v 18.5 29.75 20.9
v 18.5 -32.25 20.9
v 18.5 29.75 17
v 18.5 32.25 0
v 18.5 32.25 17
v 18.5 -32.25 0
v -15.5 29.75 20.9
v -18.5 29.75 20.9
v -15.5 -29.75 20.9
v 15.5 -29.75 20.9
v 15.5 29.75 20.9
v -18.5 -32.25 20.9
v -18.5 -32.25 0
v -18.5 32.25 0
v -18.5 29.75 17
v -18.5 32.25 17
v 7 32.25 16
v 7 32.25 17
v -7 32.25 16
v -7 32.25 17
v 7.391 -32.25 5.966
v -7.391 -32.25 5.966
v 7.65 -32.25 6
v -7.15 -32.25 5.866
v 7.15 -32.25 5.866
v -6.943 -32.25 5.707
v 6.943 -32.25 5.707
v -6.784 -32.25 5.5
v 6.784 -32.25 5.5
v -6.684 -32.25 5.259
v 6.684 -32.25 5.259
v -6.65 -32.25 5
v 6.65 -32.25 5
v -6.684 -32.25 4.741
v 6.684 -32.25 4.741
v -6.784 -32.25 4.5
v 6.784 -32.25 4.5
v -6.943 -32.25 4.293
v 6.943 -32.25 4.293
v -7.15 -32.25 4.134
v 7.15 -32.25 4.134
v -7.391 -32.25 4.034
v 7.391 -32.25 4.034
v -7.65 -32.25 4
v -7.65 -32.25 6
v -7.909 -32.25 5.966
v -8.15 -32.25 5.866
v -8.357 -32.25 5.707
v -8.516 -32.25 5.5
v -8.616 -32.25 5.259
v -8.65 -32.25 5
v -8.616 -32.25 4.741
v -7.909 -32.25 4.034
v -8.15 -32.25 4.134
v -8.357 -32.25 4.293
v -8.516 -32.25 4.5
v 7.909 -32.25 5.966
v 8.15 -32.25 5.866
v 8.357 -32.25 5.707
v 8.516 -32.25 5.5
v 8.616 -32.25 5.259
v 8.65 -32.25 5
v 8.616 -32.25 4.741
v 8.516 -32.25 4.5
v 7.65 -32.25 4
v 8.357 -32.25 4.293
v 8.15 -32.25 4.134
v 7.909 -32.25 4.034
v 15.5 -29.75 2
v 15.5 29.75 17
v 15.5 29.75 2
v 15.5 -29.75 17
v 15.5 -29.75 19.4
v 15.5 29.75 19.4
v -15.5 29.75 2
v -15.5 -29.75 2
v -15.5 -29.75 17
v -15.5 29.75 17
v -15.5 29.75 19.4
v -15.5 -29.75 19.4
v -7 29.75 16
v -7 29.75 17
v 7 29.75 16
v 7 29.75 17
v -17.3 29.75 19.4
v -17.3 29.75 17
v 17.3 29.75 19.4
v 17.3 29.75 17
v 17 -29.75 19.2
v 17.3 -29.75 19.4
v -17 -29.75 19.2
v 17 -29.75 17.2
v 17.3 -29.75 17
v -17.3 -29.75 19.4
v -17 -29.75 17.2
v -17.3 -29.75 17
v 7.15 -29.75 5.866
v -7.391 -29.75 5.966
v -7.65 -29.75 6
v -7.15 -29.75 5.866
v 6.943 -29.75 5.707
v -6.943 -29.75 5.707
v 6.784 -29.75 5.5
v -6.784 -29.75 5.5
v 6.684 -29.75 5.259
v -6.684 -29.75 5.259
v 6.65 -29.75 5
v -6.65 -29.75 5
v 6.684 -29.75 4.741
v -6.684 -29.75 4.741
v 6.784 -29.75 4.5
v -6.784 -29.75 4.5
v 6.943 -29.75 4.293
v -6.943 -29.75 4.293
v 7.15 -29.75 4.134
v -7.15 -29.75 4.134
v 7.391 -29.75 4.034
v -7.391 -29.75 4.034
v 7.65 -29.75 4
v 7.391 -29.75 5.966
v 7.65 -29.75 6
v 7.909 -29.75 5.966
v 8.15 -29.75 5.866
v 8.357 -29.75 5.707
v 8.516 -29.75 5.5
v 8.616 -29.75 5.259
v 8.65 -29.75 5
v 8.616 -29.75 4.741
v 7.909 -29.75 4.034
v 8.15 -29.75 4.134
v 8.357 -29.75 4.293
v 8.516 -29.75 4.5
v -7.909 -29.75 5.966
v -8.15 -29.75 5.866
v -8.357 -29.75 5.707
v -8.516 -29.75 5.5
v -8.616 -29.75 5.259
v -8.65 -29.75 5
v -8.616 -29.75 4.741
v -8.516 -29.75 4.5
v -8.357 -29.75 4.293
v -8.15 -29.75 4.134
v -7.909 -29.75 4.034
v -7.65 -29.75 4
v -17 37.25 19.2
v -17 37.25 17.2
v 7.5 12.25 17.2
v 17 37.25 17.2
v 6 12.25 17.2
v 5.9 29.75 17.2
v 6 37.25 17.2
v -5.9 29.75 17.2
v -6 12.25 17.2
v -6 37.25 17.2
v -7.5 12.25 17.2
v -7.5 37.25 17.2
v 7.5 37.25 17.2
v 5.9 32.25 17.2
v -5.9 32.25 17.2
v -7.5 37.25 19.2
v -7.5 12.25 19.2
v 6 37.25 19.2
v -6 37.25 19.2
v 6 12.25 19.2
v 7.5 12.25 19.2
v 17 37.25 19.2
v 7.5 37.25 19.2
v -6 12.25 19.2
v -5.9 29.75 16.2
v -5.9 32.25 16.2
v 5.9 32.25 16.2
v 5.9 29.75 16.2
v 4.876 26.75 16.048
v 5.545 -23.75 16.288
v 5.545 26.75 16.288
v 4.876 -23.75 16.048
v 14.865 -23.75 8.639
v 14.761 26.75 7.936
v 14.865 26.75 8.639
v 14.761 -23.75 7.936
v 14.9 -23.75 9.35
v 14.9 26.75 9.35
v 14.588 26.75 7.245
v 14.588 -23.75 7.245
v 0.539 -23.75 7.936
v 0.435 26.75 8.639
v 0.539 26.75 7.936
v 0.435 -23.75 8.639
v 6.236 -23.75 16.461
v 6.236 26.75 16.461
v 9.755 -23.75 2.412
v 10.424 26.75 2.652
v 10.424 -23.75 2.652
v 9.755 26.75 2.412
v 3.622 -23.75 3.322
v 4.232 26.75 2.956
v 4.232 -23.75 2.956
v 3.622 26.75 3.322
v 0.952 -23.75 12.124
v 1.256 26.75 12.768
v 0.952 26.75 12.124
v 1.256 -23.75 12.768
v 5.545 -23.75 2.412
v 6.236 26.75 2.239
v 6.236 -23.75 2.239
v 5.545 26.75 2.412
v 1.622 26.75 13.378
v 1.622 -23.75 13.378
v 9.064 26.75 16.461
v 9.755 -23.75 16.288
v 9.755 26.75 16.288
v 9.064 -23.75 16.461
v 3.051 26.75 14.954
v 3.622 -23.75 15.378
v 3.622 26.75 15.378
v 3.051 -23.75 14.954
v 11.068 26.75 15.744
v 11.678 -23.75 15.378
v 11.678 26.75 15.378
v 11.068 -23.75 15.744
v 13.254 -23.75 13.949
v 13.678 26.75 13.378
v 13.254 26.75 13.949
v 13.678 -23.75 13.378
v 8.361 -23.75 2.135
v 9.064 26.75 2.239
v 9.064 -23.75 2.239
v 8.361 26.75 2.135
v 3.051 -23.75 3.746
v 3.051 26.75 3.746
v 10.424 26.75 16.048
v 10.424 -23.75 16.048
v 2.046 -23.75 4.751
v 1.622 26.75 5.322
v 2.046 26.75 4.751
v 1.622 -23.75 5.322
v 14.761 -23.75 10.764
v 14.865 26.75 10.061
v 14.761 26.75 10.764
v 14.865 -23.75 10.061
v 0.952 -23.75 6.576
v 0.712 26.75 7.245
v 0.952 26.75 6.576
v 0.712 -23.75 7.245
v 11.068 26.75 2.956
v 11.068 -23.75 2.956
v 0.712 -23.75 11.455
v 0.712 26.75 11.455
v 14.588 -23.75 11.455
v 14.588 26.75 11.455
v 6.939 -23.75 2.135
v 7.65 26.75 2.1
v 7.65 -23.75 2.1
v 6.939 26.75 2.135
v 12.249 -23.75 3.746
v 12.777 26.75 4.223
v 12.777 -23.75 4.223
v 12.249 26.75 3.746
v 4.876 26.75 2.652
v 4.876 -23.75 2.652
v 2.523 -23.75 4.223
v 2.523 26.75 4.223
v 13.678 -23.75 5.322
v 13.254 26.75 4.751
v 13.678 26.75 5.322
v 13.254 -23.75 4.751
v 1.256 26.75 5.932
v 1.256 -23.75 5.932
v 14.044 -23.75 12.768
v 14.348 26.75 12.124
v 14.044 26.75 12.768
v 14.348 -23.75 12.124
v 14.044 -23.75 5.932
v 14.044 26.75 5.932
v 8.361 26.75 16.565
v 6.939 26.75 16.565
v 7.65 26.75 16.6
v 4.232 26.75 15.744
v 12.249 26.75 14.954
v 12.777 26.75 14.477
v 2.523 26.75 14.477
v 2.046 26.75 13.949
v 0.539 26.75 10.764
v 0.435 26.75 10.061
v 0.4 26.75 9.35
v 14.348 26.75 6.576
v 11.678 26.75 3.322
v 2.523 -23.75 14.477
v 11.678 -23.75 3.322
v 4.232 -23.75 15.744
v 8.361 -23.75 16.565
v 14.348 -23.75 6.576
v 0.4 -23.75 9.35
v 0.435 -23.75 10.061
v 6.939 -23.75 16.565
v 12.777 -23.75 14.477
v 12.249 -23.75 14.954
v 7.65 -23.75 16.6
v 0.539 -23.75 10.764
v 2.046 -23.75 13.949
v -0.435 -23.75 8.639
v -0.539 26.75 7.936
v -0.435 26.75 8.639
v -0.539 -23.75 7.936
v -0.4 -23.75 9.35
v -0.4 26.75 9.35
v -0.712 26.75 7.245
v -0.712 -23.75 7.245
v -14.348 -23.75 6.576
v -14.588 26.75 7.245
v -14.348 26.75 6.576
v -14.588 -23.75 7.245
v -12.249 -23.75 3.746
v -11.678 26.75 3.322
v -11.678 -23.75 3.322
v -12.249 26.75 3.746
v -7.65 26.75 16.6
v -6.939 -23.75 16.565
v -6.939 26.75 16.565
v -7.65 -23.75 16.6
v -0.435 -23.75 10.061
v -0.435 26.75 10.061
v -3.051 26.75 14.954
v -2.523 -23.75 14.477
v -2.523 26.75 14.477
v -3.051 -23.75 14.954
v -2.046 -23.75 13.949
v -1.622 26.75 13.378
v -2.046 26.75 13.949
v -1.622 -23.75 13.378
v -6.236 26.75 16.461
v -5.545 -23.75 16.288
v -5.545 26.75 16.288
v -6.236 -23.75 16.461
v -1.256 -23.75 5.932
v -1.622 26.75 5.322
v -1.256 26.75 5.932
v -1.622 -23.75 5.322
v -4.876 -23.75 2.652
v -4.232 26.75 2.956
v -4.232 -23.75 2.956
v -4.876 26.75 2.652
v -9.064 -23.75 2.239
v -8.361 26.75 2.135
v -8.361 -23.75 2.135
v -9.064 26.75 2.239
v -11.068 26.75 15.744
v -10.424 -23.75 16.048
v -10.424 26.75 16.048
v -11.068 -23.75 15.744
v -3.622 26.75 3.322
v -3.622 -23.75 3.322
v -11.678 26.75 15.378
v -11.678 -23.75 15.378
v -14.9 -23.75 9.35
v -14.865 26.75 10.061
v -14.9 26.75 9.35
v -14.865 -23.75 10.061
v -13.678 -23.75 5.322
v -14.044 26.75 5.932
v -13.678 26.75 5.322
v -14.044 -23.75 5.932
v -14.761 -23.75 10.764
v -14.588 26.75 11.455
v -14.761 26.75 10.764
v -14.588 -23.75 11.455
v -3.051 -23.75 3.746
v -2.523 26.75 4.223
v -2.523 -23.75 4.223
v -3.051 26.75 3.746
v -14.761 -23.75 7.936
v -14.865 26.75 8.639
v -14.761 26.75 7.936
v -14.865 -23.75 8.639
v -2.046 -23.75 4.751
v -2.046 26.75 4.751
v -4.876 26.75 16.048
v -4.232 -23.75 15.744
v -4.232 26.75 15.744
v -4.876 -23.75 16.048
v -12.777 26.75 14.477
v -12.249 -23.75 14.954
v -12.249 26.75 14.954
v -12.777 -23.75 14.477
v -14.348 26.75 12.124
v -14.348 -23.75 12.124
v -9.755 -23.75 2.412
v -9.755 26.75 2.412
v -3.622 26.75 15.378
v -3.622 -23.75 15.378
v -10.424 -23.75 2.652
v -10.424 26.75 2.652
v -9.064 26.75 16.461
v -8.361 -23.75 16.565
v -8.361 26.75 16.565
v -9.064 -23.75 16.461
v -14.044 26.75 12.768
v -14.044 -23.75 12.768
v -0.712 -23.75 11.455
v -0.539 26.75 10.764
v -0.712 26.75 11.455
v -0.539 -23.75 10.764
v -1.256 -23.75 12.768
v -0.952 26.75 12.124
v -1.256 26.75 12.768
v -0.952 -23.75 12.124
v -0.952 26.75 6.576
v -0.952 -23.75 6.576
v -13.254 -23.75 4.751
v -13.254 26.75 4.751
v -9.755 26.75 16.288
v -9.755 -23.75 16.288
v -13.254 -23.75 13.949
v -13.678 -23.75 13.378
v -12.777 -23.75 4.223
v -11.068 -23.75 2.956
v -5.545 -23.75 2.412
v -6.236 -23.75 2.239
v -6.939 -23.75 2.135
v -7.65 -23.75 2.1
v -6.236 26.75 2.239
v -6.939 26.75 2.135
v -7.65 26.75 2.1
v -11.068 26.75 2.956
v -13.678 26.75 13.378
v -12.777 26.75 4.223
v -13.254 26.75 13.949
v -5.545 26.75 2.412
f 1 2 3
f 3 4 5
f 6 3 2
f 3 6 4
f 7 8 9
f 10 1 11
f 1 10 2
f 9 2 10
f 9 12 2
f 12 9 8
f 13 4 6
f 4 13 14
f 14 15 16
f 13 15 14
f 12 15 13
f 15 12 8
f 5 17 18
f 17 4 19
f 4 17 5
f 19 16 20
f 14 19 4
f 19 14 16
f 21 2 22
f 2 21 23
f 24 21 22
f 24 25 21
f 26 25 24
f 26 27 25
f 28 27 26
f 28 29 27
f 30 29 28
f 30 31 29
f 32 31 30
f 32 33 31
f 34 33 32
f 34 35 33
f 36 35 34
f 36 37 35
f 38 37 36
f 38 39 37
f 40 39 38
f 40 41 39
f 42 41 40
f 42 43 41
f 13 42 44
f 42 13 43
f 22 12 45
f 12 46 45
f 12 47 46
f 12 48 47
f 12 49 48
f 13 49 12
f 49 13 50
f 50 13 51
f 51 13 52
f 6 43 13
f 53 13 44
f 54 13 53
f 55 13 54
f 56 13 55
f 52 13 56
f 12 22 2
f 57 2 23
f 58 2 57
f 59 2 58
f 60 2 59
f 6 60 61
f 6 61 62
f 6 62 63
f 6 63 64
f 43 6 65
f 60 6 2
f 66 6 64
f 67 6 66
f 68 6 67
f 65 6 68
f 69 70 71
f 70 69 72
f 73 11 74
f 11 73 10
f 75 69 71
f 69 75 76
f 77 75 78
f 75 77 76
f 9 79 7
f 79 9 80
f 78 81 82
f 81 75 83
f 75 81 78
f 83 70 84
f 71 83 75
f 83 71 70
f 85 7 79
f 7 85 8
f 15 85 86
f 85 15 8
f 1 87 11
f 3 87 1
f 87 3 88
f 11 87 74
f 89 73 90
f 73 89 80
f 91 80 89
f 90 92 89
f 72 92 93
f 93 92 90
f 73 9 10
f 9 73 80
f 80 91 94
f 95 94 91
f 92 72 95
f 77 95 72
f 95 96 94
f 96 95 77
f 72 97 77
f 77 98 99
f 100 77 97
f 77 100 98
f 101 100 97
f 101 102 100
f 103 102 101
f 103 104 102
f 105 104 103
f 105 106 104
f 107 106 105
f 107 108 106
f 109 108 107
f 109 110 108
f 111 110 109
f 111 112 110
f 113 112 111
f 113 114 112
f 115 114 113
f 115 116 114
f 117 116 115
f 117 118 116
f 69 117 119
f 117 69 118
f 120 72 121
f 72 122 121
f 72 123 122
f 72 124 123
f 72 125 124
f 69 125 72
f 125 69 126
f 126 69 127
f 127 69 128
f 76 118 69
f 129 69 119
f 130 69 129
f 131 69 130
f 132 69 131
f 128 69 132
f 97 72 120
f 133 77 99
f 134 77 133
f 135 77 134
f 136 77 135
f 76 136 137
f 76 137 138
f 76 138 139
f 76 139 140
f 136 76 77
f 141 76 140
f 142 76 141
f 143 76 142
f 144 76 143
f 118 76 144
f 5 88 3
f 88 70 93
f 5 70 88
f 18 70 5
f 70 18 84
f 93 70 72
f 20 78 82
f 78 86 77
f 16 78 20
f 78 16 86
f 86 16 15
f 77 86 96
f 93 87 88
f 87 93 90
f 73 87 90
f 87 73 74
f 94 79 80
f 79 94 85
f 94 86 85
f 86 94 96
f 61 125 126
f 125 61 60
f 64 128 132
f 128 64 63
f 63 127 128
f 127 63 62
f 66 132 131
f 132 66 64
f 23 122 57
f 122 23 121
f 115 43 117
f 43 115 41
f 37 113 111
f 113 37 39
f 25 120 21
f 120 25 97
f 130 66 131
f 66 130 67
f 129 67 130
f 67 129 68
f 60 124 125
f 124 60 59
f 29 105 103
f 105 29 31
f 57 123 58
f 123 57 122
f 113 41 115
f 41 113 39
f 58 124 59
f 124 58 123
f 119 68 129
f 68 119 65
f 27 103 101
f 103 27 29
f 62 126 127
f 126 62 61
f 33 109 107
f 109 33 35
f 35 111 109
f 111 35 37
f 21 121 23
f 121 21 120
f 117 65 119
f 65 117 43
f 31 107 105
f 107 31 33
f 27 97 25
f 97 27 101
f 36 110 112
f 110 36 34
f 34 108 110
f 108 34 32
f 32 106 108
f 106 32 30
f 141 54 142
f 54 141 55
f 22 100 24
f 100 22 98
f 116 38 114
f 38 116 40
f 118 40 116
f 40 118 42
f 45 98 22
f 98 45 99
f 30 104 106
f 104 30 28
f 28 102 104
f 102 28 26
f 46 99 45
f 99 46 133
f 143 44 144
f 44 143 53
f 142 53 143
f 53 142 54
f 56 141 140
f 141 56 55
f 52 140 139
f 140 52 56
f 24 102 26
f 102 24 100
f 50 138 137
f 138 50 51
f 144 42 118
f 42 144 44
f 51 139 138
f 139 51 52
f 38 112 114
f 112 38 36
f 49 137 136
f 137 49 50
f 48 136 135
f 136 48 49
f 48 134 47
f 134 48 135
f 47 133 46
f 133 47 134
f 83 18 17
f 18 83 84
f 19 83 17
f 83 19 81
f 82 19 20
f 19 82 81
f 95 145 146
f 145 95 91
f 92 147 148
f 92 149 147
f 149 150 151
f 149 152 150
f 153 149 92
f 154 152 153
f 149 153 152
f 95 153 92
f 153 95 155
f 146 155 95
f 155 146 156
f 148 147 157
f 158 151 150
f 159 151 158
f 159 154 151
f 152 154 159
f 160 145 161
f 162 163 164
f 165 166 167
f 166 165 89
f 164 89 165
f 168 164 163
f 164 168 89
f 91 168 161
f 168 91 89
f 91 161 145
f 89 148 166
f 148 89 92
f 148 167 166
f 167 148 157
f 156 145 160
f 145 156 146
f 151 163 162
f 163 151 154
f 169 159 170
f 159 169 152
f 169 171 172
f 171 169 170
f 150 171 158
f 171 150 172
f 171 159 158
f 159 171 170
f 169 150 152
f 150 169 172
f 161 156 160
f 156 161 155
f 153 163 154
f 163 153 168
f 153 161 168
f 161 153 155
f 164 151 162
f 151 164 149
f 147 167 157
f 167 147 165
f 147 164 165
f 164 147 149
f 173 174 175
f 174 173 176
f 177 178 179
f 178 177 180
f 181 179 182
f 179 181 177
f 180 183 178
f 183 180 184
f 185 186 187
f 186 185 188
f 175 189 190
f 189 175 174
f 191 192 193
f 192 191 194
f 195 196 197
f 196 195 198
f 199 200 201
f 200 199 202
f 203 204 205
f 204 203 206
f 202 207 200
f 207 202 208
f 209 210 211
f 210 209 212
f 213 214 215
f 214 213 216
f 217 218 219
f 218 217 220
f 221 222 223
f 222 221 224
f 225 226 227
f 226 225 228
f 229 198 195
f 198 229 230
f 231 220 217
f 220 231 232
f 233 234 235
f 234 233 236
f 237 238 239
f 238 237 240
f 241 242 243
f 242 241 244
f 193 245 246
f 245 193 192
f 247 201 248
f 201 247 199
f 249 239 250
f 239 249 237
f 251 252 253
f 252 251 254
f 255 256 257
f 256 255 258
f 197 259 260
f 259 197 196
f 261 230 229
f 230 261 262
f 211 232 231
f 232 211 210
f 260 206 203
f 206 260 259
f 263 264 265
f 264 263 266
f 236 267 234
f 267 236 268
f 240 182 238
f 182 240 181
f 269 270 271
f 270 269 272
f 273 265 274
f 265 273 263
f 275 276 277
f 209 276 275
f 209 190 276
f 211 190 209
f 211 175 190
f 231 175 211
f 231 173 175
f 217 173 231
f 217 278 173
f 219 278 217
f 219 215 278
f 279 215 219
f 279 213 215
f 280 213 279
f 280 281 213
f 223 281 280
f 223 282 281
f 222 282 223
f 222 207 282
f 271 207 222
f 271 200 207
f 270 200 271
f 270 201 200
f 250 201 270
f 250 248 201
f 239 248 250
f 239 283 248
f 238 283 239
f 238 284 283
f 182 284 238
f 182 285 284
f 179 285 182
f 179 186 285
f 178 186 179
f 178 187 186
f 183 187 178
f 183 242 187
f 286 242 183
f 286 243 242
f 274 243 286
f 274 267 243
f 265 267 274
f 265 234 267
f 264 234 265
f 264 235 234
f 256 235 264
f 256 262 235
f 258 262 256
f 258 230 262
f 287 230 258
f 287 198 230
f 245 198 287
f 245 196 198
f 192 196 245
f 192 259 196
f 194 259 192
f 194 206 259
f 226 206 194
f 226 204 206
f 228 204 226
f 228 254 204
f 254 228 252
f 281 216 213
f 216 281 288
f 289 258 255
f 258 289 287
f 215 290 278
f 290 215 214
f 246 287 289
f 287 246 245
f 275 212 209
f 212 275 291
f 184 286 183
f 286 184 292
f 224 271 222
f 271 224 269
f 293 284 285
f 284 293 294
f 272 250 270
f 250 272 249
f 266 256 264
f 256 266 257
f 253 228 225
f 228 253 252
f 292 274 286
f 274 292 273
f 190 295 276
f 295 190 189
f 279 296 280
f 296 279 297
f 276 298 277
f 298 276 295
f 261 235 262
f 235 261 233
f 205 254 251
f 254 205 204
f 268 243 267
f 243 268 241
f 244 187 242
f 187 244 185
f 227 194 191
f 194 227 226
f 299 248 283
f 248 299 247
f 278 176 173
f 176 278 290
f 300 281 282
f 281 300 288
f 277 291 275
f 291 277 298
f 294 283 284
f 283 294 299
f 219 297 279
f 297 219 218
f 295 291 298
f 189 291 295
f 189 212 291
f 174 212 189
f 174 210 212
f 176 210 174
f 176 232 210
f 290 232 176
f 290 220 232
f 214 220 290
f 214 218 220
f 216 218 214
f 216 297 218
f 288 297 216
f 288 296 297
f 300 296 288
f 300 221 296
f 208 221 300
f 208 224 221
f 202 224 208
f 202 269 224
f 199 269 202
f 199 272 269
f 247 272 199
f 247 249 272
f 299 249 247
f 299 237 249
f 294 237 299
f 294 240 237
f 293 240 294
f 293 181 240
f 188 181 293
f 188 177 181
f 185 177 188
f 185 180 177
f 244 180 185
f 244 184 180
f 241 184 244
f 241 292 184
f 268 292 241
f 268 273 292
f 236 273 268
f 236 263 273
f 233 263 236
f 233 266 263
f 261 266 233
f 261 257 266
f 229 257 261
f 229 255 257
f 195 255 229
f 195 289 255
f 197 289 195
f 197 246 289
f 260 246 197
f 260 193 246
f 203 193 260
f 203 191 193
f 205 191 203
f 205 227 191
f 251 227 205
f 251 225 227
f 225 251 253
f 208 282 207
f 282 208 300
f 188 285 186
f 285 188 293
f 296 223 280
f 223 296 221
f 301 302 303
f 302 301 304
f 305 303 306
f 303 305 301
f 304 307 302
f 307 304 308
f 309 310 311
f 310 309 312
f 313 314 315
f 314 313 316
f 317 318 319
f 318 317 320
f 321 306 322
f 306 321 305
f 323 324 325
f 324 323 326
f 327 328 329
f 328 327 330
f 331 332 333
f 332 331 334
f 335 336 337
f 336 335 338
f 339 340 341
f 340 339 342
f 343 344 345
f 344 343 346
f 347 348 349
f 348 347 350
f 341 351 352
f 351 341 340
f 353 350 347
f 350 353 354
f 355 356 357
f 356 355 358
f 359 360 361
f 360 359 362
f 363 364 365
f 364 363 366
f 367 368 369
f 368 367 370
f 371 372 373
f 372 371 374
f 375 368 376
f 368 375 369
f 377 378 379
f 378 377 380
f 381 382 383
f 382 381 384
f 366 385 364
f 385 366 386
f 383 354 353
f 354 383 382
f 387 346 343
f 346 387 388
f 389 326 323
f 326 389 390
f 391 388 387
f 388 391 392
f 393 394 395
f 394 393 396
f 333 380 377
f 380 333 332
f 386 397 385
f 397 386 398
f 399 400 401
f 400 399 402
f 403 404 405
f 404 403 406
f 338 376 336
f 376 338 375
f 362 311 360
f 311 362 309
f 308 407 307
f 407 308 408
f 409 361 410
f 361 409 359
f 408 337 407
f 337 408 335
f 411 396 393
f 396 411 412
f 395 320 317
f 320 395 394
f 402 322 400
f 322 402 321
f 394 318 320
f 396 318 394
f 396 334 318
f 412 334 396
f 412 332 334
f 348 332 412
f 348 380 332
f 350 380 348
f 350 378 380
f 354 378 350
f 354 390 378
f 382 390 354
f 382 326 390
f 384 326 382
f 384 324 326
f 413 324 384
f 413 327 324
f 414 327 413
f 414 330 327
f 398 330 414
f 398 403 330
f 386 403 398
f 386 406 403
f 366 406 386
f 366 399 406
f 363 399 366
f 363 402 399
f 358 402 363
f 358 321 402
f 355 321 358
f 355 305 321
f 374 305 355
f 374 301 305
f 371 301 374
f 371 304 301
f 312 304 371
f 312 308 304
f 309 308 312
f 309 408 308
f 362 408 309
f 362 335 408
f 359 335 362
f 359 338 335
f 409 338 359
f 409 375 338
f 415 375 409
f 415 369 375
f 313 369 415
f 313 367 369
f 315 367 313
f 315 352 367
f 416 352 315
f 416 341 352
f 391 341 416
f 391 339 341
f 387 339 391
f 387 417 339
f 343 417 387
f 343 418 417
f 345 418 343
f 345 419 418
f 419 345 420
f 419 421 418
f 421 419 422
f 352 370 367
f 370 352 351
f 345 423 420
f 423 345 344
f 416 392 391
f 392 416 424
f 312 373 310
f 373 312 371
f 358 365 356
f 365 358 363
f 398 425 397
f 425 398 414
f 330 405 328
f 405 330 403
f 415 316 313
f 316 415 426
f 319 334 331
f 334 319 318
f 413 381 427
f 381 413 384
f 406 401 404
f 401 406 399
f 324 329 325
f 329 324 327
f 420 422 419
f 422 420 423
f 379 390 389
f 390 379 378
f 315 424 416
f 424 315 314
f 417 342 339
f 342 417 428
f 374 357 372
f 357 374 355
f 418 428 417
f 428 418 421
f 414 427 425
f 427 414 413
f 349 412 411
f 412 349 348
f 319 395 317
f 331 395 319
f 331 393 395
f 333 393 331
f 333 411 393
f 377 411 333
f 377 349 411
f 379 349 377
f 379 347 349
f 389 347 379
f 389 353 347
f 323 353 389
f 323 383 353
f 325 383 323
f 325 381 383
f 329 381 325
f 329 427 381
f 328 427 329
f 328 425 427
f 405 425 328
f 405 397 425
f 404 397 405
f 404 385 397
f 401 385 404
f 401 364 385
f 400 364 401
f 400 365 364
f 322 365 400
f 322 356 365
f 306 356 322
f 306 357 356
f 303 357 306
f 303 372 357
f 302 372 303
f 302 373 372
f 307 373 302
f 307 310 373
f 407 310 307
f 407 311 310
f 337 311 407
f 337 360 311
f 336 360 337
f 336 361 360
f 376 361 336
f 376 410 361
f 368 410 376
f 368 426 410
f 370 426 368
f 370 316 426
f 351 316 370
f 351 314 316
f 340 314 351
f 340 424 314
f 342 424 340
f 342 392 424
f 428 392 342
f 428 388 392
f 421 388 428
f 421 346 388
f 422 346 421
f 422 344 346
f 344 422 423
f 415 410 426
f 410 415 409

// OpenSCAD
/* Holder for two AA batteries with sliding cover.
   PLA, 0.4mm nozzle, no supports. Units mm.
   Print orientation: +Z up, parts rest on min z.
*/

// ---------- parameters ----------
battery_d = 14.5;
battery_l = 50.5;
side_gap = 0.6;      // battery side to wall
mid_gap = 0.8;       // between batteries
Wi = 2*battery_d + mid_gap + 2*side_gap; // 31.0 interior width
Li = battery_l + 3 + 6;                  // 59.5 interior length
floor_t = 2.0;
side_t = 3.0;
end_t = 2.5;
Wext = Wi + 2*side_t;   // 37
Lext = Li + 2*end_t;    // 64.5
wall_top = 20.9;
low_top = 17.0;
groove_bottom = 17.0;
groove_h = 2.4;
groove_top = groove_bottom + groove_h; // 19.4
groove_depth = 1.8;
engage = 1.5;
Wc = Wi + 2*engage;     // 34 cover width
Lc0 = Lext/2 + Li/2;      // 62 main length (leading edge butts on spring wall)
lip_len = 5.0;
Lc = Lc0 + lip_len;     // 67 total cover length
y0b = -Lext/2;          // -32.25 base min y
y1b = Lext/2;           // 32.25 base max y
y0c = -Li/2;            // -29.75 cover min y (stops at spring wall inner face)
y1c = Lext/2 + lip_len; // 37.25 cover max y
tc = 2.0;
finger_w = 12;
slot_w = 1.5;
finger_y0 = 12.25;
tooth_w = 11.8;
tooth_yl = 2.5;
tooth_y0 = 29.75;
tooth_y1 = tooth_y0 + tooth_yl; // 32.25
tooth_h = 1.0;
notch_hw = 7;
notch_y0 = 29.65;
notch_y1 = 32.35;
notch_bot = 16.0;
bx = battery_d/2 + mid_gap/2; // 7.65 battery center x
battery_y0 = -Li/2 + 6;       // -23.75 spring side
battery_y1 = battery_y0 + battery_l; // 26.75
battery_yc = (battery_y0 + battery_y1)/2; // 1.5
battery_zc = floor_t + battery_d/2 + 0.1; // 9.35 slight lift
wire_z = 5;
wire_r = 1.0;

part = "assembly"; // [base, cover, assembly]
cadverify_only = "";
module instance(name, part, unit = 1) {
    echo(cadverify_instance = [name, part, unit]);
    if (cadverify_only == "" || cadverify_only == name) children();
}

module battery() {
    rotate([-90,0,0])
        cylinder(d=battery_d, h=battery_l, center=true, $fn=64);
}

module base() {
    difference() {
        // outer solid
        translate([-Wext/2, y0b, 0])
            cube([Wext, Lext, wall_top]);
        // interior cavity open at top
        translate([-Wi/2, -Li/2, floor_t])
            cube([Wi, Li, wall_top - floor_t + 1]);
        // low end wall cut (+Y end)
        translate([-Wext/2, Li/2, low_top])
            cube([Wext, Lext/2 - Li/2 + 0.5, wall_top - low_top + 1]);
        // left groove
        translate([Wi/2, -Li/2, groove_bottom])
            cube([groove_depth, Li/2 + Lext/2 + 0.5, groove_h]);
        // right groove
        translate([-Wi/2 - groove_depth, -Li/2, groove_bottom])
            cube([groove_depth, Li/2 + Lext/2 + 0.5, groove_h]);
        // wire holes through spring (-Y) wall
        translate([bx, y0b - 1, wire_z])
            rotate([-90,0,0])
                cylinder(r=wire_r, h=end_t + 2, $fn=24);
        translate([-bx, y0b - 1, wire_z])
            rotate([-90,0,0])
                cylinder(r=wire_r, h=end_t + 2, $fn=24);
        // latch notch in low wall top
        translate([-notch_hw, notch_y0, notch_bot])
            cube([2*notch_hw, notch_y1 - notch_y0, low_top - notch_bot + 0.02]);
    }
}

module cover() {
    // print orientation: plate 0..tc, tooth on top tc..tc+tooth_h
    difference() {
        union() {
            translate([-Wc/2, y0c, 0])
                cube([Wc, Lc, tc]);
            // latch tooth on top (becomes bottom after flip)
            translate([-tooth_w/2, tooth_y0, tc])
                cube([tooth_w, tooth_yl, tooth_h]);
        }
        // finger slots, open at +Y lip end
        translate([finger_w/2, finger_y0, -0.5])
            cube([slot_w, y1c - finger_y0 + 0.5, tc + 1.5]);
        translate([-finger_w/2 - slot_w, finger_y0, -0.5])
            cube([slot_w, y1c - finger_y0 + 0.5, tc + 1.5]);
    }
}

module assembly() {
    instance("base", "base", 1) base();
    instance("battery_left", "external", 1)
        translate([bx, battery_yc, battery_zc]) battery();
    instance("battery_right", "external", 1)
        translate([-bx, battery_yc, battery_zc]) battery();
    // cover printed upside-down: rotate 180 about Y then lift
    instance("cover", "cover", 1)
        translate([0, 0, 19.2]) rotate([0,180,0]) cover();
}

// ---------- specs ----------
if (part == "base") {
    echo(cadverify_spec = [
        ["bounds", [[-Wext/2, y0b, 0], [Wext/2, y1b, wall_top]]],
        ["bodies", 1],
        ["through_holes", 2],
        ["support_faces", [["bottom", "-z", 2000]]],
        ["overhangs_allowed", [
            ["groove ceilings bridge 3.6mm", [[Wi/2 - 0.6, -Li/2 - 0.5, groove_bottom - 0.5], [Wi/2 + groove_depth + 0.5, y1b + 0.2, groove_top + 0.6]]],
            ["groove ceilings bridge 3.6mm", [[-Wi/2 - groove_depth - 0.5, -Li/2 - 0.5, groove_bottom - 0.5], [-Wi/2 + 0.6, y1b + 0.2, groove_top + 0.6]]],
            ["wire holes 2mm dia bridges", [[-10, y0b - 0.5, wire_z - 1.5], [10, -Li/2 + 0.5, wire_z + 1.5]]]
        ]],
        ["copies", 1],
        ["details", [
            ["cavity", "void", [[-Wi/2, -Li/2, floor_t], [Wi/2, Li/2, 17]], 0.9],
            ["spring_room", "void", [[-Wi/2, -Li/2, floor_t], [Wi/2, -Li/2 + 6, 16.6]], 0.9],
            ["pos_room", "void", [[-Wi/2, Li/2 - 3, floor_t], [Wi/2, Li/2, 16.6]], 0.9],
            ["groove_left", "void", [[Wi/2, -Li/2, groove_bottom], [Wi/2 + groove_depth, y1b, groove_top]], 0.85],
            ["groove_right", "void", [[-Wi/2 - groove_depth, -Li/2, groove_bottom], [-Wi/2, y1b, groove_top]], 0.85],
            ["notch", "void", [[-notch_hw, notch_y0, notch_bot], [notch_hw, notch_y1, low_top + 0.02]], 0.85],
            ["wire1", "hole", [bx, y0b - 1, wire_z], [0, 1, 0], [[0, 2], [2, 2]]],
            ["wire2", "hole", [-bx, y0b - 1, wire_z], [0, 1, 0], [[0, 2], [2, 2]]],
            ["floor", "thickness", [0, 0, -1], [0, 0, 1], 2.0],
            ["side_wall", "thickness", [Wext/2 + 1, 0, 18.2], [-1, 0, 0], 1.2],
            ["end_wall", "thickness", [0, y1b + 1, 10], [0, -1, 0], 2.5]
        ]]
    ]);
    base();
} else if (part == "cover") {
    echo(cadverify_spec = [
        ["bounds", [[-Wc/2, y0c, 0], [Wc/2, y1c, tc + tooth_h]]],
        ["bodies", 1],
        ["through_holes", 0],
        ["support_faces", [["bottom", "-z", 1500]]],
        ["overhangs_allowed", []],
        ["copies", 1],
        ["details", [
            ["plate", "thickness", [0, -10, -1], [0, 0, 1], 2.0],
            ["finger", "material", [[-finger_w/2, finger_y0, 0], [finger_w/2, y1c, tc]], 0.85],
            ["slot_left", "void", [[finger_w/2, finger_y0, -0.5], [finger_w/2 + slot_w, y1c + 0.01, tc + 0.5]], 0.85],
            ["slot_right", "void", [[-finger_w/2 - slot_w, finger_y0, -0.5], [-finger_w/2, y1c + 0.01, tc + 0.5]], 0.85],
            ["tooth", "material", [[-tooth_w/2, tooth_y0, tc], [tooth_w/2, tooth_y1, tc + tooth_h]], 0.85],
            ["lip", "material", [[-Wc/2, y1b, 0], [Wc/2, y1c, tc]], 0.9]
        ]]
    ]);
    cover();
} else if (part == "assembly") {
    echo(cadverify_spec = [
        ["bounds", [[-Wext/2, y0b, 0], [Wext/2, y1c, wall_top]]],
        ["support_faces", [["bottom", "-z", 2000]]],
        ["allowed_interferences", []],
        ["motions", [
            ["slide_cover", ["cover"], "slide", [0, 1, 0], [0, 60], ["flex", [["cover", "base", 1.0, "latch tooth rides over end wall"]]]]
        ]],
        ["assembly_order", [
            [["base"], [0, 0, 0]],
            [["battery_left"], [0, 0, -1]],
            [["battery_right"], [0, 0, -1]],
            [["cover"], [0, -1, 0]]
        ]]
    ]);
    assembly();
}
